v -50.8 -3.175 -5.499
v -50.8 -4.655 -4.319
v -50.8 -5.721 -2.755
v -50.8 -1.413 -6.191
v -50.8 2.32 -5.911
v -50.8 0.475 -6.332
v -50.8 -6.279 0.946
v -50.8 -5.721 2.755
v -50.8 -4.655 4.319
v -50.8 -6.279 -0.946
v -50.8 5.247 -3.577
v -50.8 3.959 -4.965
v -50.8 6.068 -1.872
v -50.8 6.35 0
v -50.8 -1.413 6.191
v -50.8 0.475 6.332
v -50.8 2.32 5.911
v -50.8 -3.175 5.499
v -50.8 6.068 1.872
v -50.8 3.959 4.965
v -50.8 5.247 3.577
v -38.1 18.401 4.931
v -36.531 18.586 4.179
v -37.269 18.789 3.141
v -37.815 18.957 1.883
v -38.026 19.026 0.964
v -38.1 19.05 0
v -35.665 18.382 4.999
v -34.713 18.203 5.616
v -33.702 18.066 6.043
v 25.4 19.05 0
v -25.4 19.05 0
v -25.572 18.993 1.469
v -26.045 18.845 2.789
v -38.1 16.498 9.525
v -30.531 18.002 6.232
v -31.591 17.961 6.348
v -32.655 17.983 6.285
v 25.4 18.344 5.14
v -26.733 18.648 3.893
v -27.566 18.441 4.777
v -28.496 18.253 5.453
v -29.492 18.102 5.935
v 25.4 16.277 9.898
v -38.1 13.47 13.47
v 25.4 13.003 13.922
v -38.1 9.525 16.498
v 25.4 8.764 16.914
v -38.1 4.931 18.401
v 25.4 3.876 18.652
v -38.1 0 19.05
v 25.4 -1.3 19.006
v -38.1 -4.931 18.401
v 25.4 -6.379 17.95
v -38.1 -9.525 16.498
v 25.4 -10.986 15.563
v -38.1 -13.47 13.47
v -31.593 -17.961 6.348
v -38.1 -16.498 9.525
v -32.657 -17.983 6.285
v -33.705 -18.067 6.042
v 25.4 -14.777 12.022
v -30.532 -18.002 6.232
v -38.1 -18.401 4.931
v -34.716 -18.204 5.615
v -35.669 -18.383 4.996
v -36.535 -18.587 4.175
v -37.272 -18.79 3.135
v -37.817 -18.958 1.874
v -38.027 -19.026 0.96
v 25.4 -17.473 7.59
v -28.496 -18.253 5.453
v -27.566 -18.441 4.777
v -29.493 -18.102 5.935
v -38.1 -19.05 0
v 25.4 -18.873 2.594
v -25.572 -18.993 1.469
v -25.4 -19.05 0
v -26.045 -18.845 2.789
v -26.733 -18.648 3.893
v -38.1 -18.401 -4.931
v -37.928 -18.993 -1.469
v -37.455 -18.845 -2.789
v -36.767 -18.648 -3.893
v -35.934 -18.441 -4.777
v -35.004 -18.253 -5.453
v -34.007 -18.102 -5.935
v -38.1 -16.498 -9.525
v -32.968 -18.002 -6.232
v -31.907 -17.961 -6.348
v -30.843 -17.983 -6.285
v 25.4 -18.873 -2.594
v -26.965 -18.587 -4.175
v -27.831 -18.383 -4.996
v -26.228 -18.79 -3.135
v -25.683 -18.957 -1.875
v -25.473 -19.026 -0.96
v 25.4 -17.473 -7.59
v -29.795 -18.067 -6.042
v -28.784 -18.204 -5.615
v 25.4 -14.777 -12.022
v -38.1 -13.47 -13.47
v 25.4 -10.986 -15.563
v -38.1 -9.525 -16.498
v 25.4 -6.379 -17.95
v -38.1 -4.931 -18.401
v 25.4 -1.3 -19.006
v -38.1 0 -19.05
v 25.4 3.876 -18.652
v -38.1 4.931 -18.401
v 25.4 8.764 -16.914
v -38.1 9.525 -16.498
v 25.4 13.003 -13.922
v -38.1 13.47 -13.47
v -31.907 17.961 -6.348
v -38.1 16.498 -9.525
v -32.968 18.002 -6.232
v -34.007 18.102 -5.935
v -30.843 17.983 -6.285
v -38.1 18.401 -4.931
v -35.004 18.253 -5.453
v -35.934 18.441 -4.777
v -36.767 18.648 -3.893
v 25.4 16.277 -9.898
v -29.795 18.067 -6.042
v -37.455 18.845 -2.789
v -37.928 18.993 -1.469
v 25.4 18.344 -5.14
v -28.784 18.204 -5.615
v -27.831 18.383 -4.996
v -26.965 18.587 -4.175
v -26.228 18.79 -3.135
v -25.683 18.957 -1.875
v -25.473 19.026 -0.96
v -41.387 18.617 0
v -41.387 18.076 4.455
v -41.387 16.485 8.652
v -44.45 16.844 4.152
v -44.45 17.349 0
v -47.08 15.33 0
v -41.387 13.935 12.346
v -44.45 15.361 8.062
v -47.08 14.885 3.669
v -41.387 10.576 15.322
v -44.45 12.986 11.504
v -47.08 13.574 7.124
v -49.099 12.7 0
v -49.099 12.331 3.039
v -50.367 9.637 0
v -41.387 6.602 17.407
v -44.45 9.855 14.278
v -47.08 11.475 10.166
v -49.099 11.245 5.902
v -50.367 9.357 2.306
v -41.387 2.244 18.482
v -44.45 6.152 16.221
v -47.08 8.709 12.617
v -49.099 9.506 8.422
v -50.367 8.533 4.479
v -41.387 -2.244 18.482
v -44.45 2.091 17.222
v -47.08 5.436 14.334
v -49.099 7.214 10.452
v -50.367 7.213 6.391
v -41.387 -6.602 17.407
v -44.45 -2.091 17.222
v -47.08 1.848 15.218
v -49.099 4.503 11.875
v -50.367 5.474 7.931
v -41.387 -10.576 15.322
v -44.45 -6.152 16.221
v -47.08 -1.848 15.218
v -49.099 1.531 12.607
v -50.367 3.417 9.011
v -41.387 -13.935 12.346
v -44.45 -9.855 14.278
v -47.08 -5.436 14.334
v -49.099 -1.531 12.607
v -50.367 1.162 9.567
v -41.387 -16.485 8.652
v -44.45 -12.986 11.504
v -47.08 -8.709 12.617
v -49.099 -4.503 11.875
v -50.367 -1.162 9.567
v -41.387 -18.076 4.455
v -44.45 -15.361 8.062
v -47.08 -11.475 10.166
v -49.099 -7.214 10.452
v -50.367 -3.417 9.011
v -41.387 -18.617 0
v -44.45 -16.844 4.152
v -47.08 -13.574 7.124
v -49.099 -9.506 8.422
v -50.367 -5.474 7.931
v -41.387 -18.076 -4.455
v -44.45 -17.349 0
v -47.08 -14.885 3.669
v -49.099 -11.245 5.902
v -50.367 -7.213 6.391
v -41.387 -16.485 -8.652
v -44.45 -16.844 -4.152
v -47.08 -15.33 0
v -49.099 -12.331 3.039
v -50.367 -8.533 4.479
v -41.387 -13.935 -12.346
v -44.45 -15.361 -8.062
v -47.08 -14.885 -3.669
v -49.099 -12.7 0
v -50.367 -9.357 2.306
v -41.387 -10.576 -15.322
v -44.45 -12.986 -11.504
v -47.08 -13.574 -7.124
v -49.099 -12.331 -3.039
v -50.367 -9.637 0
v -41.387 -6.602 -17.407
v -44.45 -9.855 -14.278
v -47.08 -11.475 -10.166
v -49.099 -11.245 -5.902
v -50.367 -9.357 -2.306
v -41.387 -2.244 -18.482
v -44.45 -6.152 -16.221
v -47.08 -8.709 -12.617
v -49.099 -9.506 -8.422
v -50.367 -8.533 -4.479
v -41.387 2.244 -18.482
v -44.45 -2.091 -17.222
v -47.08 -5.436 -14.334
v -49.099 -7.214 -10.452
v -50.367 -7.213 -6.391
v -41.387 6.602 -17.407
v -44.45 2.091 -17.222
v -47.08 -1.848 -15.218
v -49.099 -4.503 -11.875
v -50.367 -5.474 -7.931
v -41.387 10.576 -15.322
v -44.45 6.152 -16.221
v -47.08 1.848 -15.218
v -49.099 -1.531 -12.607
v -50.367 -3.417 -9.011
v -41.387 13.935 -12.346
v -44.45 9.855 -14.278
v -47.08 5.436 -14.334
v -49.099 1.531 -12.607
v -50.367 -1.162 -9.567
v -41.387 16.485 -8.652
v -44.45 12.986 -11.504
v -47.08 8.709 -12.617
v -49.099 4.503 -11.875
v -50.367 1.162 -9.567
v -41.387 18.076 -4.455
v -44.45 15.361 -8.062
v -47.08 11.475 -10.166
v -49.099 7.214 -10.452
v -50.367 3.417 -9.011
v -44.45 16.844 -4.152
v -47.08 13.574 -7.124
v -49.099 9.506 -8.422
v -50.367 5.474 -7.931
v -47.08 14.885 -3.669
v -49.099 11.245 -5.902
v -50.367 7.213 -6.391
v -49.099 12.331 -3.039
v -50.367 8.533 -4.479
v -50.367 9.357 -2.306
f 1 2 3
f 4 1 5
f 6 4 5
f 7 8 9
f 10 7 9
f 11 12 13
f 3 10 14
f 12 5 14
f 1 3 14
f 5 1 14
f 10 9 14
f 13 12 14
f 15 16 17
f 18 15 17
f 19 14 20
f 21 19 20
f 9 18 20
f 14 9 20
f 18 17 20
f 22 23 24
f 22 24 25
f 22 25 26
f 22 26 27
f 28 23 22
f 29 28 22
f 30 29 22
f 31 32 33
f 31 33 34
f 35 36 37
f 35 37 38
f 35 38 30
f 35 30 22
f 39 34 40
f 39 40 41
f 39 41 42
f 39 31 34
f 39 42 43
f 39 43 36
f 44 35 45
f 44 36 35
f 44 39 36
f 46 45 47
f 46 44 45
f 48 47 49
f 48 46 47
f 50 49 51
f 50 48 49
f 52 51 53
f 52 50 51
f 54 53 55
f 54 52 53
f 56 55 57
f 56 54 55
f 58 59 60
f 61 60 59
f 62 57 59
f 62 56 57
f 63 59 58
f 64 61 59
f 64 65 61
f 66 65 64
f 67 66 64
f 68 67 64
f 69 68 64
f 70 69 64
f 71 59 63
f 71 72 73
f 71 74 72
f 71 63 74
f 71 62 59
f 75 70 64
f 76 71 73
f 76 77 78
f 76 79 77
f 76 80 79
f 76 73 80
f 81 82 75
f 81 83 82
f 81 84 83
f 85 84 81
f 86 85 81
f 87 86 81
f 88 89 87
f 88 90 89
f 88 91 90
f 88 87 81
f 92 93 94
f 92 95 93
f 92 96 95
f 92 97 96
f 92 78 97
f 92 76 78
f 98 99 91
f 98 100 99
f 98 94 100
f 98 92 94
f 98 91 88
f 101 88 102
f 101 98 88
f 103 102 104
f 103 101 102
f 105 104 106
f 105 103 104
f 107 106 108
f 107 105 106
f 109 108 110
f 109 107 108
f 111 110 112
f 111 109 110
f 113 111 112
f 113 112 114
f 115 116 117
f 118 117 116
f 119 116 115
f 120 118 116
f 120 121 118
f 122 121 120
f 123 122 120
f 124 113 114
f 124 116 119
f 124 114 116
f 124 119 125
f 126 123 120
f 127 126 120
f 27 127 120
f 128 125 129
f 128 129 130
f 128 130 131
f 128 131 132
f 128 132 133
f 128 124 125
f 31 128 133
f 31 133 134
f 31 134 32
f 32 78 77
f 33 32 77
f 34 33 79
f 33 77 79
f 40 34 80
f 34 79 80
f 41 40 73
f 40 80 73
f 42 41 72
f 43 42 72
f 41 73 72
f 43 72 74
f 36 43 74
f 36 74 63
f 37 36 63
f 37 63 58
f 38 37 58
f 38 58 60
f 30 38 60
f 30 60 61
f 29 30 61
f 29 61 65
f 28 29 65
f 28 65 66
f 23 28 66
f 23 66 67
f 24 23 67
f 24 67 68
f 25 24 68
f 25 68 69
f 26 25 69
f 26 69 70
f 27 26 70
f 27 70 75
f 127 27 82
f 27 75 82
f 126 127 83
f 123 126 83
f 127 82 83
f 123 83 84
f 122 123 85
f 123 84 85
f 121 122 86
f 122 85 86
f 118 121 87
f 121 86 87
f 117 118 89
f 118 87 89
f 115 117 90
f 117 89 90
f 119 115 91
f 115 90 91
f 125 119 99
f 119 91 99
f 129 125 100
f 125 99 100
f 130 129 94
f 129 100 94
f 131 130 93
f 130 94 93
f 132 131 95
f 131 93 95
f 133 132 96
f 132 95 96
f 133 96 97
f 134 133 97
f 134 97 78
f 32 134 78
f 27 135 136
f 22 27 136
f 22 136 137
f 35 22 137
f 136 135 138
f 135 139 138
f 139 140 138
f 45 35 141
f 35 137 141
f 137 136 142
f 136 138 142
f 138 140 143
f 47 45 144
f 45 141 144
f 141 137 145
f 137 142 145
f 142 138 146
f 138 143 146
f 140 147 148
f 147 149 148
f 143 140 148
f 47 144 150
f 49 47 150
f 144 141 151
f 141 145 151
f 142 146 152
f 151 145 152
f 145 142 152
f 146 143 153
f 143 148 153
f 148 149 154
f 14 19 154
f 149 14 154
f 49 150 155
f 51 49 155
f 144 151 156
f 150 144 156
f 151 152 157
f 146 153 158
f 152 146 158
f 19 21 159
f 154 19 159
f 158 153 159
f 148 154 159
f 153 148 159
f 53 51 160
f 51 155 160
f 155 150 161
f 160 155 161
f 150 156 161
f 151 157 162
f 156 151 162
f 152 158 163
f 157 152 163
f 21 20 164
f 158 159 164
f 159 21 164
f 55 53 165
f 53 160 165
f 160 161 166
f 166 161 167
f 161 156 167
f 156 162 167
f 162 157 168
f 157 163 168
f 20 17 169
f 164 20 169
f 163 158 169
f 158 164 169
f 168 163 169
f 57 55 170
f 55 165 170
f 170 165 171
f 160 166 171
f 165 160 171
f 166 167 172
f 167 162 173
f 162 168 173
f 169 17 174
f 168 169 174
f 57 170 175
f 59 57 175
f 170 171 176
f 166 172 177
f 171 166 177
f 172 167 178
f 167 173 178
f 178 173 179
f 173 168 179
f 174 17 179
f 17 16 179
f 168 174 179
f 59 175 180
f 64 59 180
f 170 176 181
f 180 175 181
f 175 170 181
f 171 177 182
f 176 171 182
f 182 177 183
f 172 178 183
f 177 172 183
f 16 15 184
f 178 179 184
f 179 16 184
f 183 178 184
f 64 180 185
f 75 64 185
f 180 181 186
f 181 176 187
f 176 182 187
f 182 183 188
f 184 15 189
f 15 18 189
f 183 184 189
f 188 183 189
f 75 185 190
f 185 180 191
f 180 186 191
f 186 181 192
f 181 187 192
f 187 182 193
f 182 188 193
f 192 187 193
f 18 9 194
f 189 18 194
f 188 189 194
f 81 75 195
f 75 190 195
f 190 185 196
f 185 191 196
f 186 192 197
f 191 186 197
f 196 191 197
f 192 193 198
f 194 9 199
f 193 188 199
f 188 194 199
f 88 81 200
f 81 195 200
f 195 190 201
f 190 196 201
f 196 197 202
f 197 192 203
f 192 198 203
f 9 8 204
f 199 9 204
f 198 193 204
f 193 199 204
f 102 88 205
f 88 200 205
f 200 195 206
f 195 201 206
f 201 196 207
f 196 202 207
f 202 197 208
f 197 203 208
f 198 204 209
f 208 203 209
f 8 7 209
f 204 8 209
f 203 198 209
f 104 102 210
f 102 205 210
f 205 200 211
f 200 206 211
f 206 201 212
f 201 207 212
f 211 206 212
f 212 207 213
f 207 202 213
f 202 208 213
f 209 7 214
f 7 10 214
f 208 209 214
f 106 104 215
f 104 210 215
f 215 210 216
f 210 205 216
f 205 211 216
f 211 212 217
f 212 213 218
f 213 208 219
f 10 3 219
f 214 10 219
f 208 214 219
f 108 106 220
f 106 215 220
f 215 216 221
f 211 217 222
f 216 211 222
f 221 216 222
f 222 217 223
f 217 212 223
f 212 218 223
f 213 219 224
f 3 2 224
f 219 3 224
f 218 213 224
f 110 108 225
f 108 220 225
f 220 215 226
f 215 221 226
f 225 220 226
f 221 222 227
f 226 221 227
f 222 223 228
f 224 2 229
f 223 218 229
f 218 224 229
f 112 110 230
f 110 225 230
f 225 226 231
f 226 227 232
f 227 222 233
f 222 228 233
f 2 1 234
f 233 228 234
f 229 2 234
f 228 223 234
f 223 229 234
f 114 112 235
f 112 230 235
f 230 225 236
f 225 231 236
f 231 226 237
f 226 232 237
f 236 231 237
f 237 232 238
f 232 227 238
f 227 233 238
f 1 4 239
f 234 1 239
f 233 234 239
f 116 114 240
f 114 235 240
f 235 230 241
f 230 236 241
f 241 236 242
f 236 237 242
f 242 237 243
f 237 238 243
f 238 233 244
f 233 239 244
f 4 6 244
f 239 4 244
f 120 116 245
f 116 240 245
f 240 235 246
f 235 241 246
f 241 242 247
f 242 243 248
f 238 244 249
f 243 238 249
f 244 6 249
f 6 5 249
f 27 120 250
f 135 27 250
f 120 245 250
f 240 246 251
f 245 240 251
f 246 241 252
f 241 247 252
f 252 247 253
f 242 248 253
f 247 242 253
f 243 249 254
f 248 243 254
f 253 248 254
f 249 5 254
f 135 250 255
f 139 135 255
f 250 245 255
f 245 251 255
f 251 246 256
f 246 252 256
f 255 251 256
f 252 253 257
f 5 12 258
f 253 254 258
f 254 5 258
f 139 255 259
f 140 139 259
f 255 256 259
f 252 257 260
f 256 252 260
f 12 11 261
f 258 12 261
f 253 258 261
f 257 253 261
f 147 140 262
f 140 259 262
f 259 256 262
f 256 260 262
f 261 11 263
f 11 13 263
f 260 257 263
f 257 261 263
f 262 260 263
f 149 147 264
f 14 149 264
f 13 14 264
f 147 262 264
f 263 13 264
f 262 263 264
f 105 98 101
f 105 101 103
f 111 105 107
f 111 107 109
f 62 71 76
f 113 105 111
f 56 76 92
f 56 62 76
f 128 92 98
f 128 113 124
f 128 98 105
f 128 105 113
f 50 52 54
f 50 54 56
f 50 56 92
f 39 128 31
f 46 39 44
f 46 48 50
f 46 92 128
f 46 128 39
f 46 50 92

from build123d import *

# Parameters (mm, degrees)
F0_R     = 19.05
F1_DEPTH = 25.4
F2_DEPTH = 25.4
F4_R     = 12.7
F3_R     = 6.35
F5_DEPTH = 19.05


with BuildPart() as f1:
    # F0 (on Right) → F1 (new body, symmetric)
    with BuildSketch(Plane.YZ):
        Circle(F0_R)
    extrude(amount=F1_DEPTH, both=True)

    # F2 (add): a face of the model
    f2_faces = [f1.faces().sort_by_distance(p)[0] for p in [
        (-25.4, 0, 0),
    ]]
    extrude(f2_faces, amount=F2_DEPTH)

    # F4
    f4_edges = [f1.edges().sort_by_distance(p)[0] for p in [
        (-50.8, -19.05, 0),
    ]]
    fillet(f4_edges, radius=F4_R)

    # F3 (on Front) → F5 (cut, symmetric)
    with BuildSketch(Plane.XZ):
        with Locations((-31.75, 0)):
            Circle(F3_R)
    extrude(amount=F5_DEPTH, both=True, mode=Mode.SUBTRACT)


solid = f1.part
